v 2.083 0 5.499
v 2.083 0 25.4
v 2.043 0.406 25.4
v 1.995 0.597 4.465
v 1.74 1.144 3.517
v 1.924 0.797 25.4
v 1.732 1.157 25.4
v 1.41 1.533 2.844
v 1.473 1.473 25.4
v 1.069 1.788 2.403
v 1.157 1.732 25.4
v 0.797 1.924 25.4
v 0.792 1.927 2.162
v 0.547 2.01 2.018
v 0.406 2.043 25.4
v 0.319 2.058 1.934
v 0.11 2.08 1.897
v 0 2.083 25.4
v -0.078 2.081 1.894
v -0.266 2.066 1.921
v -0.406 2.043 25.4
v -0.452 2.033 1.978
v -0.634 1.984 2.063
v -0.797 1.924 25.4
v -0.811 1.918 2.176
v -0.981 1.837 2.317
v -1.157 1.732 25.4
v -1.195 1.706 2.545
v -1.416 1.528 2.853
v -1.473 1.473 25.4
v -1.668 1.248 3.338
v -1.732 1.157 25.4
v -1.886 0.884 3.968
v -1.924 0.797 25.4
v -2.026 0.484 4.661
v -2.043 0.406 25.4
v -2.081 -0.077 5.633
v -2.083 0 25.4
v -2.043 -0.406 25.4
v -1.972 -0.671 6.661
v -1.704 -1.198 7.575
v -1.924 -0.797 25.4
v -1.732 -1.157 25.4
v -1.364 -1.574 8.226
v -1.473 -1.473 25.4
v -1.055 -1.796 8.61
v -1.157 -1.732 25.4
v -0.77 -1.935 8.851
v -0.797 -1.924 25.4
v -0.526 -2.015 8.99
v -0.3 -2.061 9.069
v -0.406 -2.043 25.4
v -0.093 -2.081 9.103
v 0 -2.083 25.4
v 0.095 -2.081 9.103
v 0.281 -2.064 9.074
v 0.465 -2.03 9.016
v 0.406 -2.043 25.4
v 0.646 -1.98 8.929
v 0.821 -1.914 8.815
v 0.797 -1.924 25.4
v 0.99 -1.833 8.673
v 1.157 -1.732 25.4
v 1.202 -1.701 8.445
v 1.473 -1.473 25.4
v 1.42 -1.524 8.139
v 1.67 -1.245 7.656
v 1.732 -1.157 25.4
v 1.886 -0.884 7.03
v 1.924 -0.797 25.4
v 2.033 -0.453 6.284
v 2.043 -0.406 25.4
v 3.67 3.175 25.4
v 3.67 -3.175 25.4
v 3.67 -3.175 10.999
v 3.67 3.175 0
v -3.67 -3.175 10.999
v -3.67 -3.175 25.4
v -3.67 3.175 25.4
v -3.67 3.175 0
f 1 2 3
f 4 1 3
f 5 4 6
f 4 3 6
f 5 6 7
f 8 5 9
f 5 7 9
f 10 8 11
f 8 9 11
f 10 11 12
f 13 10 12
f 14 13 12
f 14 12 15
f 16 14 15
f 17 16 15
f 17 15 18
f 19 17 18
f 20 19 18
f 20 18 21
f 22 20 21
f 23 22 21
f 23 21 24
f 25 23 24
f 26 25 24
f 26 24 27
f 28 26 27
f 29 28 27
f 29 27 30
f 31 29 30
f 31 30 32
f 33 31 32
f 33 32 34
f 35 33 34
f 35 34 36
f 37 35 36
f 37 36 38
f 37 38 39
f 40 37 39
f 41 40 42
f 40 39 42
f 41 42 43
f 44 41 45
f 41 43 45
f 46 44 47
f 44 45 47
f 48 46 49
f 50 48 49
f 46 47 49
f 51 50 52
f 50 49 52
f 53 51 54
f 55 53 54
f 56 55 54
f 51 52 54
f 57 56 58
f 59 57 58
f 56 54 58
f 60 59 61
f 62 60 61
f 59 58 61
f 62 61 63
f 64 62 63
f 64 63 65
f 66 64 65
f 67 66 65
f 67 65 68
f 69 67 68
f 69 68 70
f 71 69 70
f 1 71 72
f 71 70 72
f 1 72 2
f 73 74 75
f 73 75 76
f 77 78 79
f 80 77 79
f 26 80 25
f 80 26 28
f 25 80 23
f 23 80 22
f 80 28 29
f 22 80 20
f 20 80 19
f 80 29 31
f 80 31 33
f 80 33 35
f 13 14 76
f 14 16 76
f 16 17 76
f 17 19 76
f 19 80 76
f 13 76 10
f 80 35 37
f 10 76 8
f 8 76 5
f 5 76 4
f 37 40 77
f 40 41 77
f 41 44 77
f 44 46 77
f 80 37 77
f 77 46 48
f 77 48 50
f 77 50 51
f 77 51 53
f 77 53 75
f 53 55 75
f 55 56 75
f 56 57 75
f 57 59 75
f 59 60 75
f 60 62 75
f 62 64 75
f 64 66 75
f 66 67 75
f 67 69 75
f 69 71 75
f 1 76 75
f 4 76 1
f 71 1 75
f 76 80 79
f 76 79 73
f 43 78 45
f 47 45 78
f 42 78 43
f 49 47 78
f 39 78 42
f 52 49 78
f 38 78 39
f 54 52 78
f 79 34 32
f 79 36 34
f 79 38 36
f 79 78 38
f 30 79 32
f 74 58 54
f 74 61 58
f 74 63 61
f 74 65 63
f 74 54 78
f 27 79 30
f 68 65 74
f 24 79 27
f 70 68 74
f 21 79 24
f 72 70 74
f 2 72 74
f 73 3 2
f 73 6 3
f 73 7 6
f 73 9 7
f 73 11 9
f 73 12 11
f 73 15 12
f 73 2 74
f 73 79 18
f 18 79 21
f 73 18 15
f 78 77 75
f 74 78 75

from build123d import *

# Parameters (mm, degrees)
SKETCH1_W           = 7.3406
SKETCH1_H           = 6.35
BOSS_EXTRUDE1_DEPTH = 25.4
CUT_EXTRUDE1_DEPTH  = 7.3406
SKETCH3_R           = 2.0828
CUT_EXTRUDE2_DEPTH  = 25.4


with BuildPart() as part:
    # Sketch1 → Boss-Extrude1 (new body)
    with BuildSketch(Plane.XY):
        Rectangle(SKETCH1_W, SKETCH1_H)
    extrude(amount=BOSS_EXTRUDE1_DEPTH)

    # Sketch2 → Cut-Extrude1 (cut)
    with BuildSketch(Plane(origin=(3.6703, 0, 0), x_dir=(0, 0, -1), z_dir=(1, 0, 0))):
        Polygon((0, 3.175), (-10.998522628, -3.175), (0, -3.175), align=None)
    extrude(amount=-CUT_EXTRUDE1_DEPTH, mode=Mode.SUBTRACT)

    # Sketch3 → Cut-Extrude2 (cut)
    with BuildSketch(Plane.XY.offset(25.4)):
        Circle(SKETCH3_R)
    extrude(amount=-CUT_EXTRUDE2_DEPTH, mode=Mode.SUBTRACT)


solid = part.part
